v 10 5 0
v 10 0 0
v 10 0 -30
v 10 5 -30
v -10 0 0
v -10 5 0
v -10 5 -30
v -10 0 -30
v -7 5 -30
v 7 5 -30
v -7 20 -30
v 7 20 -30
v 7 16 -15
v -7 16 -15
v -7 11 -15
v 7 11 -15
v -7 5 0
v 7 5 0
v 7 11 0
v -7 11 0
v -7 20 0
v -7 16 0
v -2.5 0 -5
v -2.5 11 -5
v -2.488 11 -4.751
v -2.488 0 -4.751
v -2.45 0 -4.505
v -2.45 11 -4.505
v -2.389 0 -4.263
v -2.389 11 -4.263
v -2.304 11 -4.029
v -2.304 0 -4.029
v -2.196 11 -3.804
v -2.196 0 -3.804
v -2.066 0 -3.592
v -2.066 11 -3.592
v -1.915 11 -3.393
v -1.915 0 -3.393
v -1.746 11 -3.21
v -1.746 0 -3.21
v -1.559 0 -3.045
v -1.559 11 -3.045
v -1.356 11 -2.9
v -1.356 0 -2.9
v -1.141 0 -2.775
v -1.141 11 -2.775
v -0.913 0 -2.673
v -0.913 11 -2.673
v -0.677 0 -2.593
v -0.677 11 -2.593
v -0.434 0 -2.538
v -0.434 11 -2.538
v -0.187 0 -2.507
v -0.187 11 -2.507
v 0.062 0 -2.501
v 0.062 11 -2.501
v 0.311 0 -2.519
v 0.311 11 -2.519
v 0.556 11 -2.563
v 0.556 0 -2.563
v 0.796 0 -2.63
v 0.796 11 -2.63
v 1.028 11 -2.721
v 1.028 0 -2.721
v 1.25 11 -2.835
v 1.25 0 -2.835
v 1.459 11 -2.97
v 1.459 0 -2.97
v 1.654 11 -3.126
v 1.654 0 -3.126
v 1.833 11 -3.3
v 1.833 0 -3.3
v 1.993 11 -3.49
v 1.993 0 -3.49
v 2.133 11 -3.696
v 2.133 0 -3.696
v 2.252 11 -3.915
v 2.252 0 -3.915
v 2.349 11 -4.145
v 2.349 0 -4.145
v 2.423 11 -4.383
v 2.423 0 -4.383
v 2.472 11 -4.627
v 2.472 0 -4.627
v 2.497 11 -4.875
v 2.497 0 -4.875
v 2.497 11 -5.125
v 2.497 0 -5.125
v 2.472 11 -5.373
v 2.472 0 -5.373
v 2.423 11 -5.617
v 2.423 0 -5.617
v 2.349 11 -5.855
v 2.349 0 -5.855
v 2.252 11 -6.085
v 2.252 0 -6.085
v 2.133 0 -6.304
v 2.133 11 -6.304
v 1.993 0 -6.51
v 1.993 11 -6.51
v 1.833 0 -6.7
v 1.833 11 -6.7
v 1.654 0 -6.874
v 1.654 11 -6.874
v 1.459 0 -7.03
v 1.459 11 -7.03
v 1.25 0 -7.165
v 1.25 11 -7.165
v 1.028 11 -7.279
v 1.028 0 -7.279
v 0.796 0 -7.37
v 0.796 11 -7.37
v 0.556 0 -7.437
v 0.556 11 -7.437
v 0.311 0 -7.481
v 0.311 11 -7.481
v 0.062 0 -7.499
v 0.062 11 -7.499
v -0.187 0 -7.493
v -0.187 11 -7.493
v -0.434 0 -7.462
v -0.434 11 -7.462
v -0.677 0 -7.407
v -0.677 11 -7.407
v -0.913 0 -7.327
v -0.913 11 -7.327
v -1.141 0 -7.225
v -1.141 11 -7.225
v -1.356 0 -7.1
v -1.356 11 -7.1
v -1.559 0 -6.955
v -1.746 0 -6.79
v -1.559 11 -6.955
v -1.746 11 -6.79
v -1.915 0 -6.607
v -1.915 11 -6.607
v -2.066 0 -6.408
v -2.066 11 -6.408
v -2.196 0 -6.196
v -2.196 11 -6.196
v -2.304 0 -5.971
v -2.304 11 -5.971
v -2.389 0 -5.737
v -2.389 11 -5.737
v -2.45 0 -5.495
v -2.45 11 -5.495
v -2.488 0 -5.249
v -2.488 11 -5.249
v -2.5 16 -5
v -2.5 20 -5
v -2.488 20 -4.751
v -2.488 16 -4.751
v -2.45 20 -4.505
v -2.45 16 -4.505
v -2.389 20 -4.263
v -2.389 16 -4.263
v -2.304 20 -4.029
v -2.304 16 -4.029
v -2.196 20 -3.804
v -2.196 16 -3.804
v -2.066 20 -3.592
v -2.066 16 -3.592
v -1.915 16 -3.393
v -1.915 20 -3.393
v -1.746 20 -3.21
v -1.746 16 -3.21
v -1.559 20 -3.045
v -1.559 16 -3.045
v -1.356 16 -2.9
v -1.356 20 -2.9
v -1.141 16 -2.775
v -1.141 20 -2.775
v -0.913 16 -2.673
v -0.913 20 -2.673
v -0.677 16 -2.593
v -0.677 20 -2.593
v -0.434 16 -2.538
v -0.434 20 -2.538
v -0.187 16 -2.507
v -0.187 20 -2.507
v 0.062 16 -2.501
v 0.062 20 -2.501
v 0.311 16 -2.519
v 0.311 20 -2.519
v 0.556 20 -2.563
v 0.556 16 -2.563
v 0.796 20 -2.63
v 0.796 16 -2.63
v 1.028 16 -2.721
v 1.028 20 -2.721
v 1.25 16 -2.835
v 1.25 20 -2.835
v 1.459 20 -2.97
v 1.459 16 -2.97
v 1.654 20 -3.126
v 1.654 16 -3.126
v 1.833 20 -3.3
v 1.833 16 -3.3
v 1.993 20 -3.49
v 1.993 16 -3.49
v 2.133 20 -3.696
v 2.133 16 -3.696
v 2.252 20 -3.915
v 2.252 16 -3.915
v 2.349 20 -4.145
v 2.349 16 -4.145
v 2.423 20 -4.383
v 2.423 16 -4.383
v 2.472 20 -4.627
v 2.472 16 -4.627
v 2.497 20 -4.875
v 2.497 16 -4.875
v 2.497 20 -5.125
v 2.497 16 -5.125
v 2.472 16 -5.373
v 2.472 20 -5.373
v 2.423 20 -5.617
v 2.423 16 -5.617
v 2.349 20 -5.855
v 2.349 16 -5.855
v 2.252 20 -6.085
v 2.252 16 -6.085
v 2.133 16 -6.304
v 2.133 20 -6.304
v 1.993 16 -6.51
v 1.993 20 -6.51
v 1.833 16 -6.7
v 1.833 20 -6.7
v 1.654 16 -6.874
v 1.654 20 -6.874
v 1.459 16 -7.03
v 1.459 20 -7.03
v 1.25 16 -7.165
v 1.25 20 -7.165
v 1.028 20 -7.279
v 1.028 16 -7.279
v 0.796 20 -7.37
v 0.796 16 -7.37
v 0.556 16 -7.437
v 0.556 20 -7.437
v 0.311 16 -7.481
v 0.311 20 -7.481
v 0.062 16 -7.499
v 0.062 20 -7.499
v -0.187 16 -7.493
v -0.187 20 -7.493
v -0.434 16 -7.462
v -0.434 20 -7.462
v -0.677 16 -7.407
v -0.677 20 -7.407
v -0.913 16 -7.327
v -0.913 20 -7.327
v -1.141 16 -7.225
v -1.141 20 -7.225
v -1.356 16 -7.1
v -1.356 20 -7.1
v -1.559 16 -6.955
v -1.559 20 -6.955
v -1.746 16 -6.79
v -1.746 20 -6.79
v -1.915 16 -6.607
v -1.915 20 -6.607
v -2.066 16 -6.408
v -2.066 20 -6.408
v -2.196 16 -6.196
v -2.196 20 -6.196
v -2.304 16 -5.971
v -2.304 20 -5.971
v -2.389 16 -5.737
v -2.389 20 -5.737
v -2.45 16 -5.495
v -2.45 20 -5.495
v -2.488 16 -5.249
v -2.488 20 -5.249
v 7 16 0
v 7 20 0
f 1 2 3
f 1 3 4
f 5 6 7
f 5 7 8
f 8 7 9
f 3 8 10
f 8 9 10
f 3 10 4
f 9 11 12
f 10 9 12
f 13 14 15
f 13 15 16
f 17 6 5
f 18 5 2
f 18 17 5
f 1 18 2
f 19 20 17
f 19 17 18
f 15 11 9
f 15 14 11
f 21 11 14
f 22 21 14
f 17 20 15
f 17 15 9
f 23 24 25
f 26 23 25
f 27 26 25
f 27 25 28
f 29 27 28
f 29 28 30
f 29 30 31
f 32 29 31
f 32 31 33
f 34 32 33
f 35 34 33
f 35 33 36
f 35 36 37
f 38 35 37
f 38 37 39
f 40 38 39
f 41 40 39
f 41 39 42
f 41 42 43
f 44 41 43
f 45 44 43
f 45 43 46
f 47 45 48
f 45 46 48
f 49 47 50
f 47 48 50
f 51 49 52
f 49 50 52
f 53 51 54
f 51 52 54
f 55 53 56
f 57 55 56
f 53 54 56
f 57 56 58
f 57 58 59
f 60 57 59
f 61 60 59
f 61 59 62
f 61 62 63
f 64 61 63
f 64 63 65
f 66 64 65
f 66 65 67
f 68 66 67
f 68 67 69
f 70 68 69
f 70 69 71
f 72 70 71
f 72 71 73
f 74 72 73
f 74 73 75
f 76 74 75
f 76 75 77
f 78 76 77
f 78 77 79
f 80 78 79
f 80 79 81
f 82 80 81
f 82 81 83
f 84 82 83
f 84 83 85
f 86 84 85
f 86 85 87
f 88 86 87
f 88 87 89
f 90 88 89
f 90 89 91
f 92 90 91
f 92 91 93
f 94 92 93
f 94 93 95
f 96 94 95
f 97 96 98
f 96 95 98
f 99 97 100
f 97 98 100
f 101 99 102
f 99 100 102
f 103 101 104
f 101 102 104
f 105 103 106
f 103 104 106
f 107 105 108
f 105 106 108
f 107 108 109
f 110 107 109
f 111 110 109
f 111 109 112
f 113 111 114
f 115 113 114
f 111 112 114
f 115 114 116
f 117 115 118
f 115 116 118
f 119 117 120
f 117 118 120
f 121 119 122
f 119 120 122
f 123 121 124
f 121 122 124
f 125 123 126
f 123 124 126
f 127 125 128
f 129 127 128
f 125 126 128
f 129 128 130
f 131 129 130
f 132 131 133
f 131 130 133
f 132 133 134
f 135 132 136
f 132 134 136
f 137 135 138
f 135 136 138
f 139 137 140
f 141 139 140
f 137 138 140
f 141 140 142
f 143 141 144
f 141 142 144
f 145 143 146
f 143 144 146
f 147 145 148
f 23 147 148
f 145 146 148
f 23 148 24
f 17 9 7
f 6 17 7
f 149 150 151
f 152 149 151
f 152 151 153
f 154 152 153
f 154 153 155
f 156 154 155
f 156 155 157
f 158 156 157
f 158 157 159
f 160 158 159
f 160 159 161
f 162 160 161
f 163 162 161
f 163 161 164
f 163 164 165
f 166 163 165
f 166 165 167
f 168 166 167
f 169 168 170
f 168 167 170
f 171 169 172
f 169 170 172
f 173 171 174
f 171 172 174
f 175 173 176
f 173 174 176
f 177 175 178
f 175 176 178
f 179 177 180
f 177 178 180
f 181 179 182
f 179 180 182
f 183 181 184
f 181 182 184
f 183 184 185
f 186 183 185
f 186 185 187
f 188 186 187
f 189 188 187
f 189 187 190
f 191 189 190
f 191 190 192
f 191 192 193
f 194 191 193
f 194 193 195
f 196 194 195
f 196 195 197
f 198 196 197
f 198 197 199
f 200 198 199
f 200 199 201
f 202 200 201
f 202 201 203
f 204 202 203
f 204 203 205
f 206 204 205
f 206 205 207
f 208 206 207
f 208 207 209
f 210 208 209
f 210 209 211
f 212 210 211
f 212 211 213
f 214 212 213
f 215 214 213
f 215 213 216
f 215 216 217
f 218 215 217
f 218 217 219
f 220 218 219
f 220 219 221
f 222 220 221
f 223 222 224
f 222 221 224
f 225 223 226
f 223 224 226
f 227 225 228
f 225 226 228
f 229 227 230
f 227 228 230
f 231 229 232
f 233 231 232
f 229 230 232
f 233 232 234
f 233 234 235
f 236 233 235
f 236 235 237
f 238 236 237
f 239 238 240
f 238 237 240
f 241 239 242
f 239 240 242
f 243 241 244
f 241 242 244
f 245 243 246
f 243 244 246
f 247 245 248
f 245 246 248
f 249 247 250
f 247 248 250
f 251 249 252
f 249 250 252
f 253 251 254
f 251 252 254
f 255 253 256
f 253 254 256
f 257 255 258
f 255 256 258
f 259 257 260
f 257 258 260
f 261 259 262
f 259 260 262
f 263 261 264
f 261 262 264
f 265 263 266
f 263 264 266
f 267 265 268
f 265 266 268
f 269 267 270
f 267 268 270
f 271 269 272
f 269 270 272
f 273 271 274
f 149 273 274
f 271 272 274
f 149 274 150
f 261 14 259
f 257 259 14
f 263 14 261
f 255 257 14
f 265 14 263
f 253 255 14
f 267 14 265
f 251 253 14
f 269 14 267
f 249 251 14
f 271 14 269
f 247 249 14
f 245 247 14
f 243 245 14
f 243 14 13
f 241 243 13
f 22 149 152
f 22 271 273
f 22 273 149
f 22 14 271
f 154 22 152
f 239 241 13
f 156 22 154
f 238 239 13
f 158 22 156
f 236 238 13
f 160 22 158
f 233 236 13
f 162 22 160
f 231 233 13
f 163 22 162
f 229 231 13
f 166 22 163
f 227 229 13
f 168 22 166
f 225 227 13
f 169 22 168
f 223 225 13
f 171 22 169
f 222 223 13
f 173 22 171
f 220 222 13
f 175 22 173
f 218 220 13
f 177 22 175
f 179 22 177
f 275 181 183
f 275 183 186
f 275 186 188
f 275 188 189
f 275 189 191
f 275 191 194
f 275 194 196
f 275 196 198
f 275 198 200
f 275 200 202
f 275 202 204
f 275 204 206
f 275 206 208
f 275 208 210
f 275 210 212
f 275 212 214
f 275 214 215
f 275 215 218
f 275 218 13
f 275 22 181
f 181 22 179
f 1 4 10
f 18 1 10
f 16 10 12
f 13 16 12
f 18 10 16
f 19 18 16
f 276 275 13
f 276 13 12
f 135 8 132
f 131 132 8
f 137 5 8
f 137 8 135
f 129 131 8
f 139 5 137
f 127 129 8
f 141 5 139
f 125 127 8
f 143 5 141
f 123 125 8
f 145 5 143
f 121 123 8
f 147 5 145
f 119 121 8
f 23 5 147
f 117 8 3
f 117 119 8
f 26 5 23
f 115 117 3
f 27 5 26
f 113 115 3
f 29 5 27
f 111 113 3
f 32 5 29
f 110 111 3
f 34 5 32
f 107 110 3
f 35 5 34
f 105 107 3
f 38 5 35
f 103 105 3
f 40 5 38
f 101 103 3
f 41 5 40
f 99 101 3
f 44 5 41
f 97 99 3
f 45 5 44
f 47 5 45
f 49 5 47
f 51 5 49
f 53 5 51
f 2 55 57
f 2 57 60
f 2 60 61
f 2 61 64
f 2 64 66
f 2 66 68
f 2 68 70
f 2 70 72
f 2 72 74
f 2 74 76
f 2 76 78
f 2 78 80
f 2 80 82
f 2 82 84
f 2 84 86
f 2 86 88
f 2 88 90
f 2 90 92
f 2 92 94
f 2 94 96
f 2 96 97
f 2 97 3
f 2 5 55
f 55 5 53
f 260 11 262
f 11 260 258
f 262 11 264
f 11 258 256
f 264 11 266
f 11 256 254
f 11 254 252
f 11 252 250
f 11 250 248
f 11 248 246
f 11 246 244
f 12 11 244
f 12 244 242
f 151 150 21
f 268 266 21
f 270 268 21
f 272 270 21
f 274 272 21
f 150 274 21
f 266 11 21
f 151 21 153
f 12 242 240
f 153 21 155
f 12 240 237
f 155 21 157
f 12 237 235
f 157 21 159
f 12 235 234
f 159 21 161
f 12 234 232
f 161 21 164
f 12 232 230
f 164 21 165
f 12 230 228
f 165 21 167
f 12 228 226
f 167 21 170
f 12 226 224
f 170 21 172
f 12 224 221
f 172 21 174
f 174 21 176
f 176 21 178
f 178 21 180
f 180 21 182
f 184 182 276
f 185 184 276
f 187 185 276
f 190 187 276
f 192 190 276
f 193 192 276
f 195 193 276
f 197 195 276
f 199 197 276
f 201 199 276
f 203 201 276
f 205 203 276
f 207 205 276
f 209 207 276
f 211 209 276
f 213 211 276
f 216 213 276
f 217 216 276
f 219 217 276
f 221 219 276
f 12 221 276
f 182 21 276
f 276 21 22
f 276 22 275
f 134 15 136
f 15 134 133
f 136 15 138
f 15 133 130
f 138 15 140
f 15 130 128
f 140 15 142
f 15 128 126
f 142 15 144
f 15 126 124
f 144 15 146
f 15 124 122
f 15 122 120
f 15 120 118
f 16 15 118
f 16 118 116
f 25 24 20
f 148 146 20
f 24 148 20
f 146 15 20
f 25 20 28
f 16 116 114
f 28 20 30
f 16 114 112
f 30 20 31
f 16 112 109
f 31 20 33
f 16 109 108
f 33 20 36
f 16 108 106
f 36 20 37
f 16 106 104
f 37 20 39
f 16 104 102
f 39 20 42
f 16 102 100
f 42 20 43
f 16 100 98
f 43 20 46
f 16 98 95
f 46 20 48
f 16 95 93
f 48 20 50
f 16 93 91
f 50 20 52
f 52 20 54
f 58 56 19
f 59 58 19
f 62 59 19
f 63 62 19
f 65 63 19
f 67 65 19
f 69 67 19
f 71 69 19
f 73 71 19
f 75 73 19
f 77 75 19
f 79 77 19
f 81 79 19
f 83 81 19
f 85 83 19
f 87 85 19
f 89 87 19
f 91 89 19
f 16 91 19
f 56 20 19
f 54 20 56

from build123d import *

# Parameters (mm, degrees)
F0_W     = 14
F0_H     = 4
F0_H_2   = 5
F1_DEPTH = 30
F2_W     = 14
F2_H     = 5
F3_DEPTH = 15
F4_R     = 2.5
F5_DEPTH = 25


with BuildPart() as f1:
    # F0 (on Top) → F1 (new body)
    with BuildSketch(Plane.XY):
        with Locations((0, 18)):
            Rectangle(F0_W, F0_H)
        with Locations((0, 13.5)):
            Rectangle(F0_W, F0_H_2)
        Polygon((-10, 5), (-10, 0), (10, 0), (10, 5), (7, 5), (7, 11), (-7, 11), (-7, 5), align=None)
    extrude(amount=-F1_DEPTH)

    # F2 (on face) → F3 (cut)
    with BuildSketch(Plane.XY):
        with Locations((0, 13.5)):
            Rectangle(F2_W, F2_H)
    extrude(amount=-F3_DEPTH, mode=Mode.SUBTRACT)

    # F4 (on face) → F5 (cut)
    with BuildSketch(Plane(origin=(0, 20, 0), x_dir=(-1, 0, 0), z_dir=(0, 1, 0))):
        with Locations((0, -5)):
            Circle(F4_R)
    extrude(amount=-F5_DEPTH, mode=Mode.SUBTRACT)


solid = f1.part
